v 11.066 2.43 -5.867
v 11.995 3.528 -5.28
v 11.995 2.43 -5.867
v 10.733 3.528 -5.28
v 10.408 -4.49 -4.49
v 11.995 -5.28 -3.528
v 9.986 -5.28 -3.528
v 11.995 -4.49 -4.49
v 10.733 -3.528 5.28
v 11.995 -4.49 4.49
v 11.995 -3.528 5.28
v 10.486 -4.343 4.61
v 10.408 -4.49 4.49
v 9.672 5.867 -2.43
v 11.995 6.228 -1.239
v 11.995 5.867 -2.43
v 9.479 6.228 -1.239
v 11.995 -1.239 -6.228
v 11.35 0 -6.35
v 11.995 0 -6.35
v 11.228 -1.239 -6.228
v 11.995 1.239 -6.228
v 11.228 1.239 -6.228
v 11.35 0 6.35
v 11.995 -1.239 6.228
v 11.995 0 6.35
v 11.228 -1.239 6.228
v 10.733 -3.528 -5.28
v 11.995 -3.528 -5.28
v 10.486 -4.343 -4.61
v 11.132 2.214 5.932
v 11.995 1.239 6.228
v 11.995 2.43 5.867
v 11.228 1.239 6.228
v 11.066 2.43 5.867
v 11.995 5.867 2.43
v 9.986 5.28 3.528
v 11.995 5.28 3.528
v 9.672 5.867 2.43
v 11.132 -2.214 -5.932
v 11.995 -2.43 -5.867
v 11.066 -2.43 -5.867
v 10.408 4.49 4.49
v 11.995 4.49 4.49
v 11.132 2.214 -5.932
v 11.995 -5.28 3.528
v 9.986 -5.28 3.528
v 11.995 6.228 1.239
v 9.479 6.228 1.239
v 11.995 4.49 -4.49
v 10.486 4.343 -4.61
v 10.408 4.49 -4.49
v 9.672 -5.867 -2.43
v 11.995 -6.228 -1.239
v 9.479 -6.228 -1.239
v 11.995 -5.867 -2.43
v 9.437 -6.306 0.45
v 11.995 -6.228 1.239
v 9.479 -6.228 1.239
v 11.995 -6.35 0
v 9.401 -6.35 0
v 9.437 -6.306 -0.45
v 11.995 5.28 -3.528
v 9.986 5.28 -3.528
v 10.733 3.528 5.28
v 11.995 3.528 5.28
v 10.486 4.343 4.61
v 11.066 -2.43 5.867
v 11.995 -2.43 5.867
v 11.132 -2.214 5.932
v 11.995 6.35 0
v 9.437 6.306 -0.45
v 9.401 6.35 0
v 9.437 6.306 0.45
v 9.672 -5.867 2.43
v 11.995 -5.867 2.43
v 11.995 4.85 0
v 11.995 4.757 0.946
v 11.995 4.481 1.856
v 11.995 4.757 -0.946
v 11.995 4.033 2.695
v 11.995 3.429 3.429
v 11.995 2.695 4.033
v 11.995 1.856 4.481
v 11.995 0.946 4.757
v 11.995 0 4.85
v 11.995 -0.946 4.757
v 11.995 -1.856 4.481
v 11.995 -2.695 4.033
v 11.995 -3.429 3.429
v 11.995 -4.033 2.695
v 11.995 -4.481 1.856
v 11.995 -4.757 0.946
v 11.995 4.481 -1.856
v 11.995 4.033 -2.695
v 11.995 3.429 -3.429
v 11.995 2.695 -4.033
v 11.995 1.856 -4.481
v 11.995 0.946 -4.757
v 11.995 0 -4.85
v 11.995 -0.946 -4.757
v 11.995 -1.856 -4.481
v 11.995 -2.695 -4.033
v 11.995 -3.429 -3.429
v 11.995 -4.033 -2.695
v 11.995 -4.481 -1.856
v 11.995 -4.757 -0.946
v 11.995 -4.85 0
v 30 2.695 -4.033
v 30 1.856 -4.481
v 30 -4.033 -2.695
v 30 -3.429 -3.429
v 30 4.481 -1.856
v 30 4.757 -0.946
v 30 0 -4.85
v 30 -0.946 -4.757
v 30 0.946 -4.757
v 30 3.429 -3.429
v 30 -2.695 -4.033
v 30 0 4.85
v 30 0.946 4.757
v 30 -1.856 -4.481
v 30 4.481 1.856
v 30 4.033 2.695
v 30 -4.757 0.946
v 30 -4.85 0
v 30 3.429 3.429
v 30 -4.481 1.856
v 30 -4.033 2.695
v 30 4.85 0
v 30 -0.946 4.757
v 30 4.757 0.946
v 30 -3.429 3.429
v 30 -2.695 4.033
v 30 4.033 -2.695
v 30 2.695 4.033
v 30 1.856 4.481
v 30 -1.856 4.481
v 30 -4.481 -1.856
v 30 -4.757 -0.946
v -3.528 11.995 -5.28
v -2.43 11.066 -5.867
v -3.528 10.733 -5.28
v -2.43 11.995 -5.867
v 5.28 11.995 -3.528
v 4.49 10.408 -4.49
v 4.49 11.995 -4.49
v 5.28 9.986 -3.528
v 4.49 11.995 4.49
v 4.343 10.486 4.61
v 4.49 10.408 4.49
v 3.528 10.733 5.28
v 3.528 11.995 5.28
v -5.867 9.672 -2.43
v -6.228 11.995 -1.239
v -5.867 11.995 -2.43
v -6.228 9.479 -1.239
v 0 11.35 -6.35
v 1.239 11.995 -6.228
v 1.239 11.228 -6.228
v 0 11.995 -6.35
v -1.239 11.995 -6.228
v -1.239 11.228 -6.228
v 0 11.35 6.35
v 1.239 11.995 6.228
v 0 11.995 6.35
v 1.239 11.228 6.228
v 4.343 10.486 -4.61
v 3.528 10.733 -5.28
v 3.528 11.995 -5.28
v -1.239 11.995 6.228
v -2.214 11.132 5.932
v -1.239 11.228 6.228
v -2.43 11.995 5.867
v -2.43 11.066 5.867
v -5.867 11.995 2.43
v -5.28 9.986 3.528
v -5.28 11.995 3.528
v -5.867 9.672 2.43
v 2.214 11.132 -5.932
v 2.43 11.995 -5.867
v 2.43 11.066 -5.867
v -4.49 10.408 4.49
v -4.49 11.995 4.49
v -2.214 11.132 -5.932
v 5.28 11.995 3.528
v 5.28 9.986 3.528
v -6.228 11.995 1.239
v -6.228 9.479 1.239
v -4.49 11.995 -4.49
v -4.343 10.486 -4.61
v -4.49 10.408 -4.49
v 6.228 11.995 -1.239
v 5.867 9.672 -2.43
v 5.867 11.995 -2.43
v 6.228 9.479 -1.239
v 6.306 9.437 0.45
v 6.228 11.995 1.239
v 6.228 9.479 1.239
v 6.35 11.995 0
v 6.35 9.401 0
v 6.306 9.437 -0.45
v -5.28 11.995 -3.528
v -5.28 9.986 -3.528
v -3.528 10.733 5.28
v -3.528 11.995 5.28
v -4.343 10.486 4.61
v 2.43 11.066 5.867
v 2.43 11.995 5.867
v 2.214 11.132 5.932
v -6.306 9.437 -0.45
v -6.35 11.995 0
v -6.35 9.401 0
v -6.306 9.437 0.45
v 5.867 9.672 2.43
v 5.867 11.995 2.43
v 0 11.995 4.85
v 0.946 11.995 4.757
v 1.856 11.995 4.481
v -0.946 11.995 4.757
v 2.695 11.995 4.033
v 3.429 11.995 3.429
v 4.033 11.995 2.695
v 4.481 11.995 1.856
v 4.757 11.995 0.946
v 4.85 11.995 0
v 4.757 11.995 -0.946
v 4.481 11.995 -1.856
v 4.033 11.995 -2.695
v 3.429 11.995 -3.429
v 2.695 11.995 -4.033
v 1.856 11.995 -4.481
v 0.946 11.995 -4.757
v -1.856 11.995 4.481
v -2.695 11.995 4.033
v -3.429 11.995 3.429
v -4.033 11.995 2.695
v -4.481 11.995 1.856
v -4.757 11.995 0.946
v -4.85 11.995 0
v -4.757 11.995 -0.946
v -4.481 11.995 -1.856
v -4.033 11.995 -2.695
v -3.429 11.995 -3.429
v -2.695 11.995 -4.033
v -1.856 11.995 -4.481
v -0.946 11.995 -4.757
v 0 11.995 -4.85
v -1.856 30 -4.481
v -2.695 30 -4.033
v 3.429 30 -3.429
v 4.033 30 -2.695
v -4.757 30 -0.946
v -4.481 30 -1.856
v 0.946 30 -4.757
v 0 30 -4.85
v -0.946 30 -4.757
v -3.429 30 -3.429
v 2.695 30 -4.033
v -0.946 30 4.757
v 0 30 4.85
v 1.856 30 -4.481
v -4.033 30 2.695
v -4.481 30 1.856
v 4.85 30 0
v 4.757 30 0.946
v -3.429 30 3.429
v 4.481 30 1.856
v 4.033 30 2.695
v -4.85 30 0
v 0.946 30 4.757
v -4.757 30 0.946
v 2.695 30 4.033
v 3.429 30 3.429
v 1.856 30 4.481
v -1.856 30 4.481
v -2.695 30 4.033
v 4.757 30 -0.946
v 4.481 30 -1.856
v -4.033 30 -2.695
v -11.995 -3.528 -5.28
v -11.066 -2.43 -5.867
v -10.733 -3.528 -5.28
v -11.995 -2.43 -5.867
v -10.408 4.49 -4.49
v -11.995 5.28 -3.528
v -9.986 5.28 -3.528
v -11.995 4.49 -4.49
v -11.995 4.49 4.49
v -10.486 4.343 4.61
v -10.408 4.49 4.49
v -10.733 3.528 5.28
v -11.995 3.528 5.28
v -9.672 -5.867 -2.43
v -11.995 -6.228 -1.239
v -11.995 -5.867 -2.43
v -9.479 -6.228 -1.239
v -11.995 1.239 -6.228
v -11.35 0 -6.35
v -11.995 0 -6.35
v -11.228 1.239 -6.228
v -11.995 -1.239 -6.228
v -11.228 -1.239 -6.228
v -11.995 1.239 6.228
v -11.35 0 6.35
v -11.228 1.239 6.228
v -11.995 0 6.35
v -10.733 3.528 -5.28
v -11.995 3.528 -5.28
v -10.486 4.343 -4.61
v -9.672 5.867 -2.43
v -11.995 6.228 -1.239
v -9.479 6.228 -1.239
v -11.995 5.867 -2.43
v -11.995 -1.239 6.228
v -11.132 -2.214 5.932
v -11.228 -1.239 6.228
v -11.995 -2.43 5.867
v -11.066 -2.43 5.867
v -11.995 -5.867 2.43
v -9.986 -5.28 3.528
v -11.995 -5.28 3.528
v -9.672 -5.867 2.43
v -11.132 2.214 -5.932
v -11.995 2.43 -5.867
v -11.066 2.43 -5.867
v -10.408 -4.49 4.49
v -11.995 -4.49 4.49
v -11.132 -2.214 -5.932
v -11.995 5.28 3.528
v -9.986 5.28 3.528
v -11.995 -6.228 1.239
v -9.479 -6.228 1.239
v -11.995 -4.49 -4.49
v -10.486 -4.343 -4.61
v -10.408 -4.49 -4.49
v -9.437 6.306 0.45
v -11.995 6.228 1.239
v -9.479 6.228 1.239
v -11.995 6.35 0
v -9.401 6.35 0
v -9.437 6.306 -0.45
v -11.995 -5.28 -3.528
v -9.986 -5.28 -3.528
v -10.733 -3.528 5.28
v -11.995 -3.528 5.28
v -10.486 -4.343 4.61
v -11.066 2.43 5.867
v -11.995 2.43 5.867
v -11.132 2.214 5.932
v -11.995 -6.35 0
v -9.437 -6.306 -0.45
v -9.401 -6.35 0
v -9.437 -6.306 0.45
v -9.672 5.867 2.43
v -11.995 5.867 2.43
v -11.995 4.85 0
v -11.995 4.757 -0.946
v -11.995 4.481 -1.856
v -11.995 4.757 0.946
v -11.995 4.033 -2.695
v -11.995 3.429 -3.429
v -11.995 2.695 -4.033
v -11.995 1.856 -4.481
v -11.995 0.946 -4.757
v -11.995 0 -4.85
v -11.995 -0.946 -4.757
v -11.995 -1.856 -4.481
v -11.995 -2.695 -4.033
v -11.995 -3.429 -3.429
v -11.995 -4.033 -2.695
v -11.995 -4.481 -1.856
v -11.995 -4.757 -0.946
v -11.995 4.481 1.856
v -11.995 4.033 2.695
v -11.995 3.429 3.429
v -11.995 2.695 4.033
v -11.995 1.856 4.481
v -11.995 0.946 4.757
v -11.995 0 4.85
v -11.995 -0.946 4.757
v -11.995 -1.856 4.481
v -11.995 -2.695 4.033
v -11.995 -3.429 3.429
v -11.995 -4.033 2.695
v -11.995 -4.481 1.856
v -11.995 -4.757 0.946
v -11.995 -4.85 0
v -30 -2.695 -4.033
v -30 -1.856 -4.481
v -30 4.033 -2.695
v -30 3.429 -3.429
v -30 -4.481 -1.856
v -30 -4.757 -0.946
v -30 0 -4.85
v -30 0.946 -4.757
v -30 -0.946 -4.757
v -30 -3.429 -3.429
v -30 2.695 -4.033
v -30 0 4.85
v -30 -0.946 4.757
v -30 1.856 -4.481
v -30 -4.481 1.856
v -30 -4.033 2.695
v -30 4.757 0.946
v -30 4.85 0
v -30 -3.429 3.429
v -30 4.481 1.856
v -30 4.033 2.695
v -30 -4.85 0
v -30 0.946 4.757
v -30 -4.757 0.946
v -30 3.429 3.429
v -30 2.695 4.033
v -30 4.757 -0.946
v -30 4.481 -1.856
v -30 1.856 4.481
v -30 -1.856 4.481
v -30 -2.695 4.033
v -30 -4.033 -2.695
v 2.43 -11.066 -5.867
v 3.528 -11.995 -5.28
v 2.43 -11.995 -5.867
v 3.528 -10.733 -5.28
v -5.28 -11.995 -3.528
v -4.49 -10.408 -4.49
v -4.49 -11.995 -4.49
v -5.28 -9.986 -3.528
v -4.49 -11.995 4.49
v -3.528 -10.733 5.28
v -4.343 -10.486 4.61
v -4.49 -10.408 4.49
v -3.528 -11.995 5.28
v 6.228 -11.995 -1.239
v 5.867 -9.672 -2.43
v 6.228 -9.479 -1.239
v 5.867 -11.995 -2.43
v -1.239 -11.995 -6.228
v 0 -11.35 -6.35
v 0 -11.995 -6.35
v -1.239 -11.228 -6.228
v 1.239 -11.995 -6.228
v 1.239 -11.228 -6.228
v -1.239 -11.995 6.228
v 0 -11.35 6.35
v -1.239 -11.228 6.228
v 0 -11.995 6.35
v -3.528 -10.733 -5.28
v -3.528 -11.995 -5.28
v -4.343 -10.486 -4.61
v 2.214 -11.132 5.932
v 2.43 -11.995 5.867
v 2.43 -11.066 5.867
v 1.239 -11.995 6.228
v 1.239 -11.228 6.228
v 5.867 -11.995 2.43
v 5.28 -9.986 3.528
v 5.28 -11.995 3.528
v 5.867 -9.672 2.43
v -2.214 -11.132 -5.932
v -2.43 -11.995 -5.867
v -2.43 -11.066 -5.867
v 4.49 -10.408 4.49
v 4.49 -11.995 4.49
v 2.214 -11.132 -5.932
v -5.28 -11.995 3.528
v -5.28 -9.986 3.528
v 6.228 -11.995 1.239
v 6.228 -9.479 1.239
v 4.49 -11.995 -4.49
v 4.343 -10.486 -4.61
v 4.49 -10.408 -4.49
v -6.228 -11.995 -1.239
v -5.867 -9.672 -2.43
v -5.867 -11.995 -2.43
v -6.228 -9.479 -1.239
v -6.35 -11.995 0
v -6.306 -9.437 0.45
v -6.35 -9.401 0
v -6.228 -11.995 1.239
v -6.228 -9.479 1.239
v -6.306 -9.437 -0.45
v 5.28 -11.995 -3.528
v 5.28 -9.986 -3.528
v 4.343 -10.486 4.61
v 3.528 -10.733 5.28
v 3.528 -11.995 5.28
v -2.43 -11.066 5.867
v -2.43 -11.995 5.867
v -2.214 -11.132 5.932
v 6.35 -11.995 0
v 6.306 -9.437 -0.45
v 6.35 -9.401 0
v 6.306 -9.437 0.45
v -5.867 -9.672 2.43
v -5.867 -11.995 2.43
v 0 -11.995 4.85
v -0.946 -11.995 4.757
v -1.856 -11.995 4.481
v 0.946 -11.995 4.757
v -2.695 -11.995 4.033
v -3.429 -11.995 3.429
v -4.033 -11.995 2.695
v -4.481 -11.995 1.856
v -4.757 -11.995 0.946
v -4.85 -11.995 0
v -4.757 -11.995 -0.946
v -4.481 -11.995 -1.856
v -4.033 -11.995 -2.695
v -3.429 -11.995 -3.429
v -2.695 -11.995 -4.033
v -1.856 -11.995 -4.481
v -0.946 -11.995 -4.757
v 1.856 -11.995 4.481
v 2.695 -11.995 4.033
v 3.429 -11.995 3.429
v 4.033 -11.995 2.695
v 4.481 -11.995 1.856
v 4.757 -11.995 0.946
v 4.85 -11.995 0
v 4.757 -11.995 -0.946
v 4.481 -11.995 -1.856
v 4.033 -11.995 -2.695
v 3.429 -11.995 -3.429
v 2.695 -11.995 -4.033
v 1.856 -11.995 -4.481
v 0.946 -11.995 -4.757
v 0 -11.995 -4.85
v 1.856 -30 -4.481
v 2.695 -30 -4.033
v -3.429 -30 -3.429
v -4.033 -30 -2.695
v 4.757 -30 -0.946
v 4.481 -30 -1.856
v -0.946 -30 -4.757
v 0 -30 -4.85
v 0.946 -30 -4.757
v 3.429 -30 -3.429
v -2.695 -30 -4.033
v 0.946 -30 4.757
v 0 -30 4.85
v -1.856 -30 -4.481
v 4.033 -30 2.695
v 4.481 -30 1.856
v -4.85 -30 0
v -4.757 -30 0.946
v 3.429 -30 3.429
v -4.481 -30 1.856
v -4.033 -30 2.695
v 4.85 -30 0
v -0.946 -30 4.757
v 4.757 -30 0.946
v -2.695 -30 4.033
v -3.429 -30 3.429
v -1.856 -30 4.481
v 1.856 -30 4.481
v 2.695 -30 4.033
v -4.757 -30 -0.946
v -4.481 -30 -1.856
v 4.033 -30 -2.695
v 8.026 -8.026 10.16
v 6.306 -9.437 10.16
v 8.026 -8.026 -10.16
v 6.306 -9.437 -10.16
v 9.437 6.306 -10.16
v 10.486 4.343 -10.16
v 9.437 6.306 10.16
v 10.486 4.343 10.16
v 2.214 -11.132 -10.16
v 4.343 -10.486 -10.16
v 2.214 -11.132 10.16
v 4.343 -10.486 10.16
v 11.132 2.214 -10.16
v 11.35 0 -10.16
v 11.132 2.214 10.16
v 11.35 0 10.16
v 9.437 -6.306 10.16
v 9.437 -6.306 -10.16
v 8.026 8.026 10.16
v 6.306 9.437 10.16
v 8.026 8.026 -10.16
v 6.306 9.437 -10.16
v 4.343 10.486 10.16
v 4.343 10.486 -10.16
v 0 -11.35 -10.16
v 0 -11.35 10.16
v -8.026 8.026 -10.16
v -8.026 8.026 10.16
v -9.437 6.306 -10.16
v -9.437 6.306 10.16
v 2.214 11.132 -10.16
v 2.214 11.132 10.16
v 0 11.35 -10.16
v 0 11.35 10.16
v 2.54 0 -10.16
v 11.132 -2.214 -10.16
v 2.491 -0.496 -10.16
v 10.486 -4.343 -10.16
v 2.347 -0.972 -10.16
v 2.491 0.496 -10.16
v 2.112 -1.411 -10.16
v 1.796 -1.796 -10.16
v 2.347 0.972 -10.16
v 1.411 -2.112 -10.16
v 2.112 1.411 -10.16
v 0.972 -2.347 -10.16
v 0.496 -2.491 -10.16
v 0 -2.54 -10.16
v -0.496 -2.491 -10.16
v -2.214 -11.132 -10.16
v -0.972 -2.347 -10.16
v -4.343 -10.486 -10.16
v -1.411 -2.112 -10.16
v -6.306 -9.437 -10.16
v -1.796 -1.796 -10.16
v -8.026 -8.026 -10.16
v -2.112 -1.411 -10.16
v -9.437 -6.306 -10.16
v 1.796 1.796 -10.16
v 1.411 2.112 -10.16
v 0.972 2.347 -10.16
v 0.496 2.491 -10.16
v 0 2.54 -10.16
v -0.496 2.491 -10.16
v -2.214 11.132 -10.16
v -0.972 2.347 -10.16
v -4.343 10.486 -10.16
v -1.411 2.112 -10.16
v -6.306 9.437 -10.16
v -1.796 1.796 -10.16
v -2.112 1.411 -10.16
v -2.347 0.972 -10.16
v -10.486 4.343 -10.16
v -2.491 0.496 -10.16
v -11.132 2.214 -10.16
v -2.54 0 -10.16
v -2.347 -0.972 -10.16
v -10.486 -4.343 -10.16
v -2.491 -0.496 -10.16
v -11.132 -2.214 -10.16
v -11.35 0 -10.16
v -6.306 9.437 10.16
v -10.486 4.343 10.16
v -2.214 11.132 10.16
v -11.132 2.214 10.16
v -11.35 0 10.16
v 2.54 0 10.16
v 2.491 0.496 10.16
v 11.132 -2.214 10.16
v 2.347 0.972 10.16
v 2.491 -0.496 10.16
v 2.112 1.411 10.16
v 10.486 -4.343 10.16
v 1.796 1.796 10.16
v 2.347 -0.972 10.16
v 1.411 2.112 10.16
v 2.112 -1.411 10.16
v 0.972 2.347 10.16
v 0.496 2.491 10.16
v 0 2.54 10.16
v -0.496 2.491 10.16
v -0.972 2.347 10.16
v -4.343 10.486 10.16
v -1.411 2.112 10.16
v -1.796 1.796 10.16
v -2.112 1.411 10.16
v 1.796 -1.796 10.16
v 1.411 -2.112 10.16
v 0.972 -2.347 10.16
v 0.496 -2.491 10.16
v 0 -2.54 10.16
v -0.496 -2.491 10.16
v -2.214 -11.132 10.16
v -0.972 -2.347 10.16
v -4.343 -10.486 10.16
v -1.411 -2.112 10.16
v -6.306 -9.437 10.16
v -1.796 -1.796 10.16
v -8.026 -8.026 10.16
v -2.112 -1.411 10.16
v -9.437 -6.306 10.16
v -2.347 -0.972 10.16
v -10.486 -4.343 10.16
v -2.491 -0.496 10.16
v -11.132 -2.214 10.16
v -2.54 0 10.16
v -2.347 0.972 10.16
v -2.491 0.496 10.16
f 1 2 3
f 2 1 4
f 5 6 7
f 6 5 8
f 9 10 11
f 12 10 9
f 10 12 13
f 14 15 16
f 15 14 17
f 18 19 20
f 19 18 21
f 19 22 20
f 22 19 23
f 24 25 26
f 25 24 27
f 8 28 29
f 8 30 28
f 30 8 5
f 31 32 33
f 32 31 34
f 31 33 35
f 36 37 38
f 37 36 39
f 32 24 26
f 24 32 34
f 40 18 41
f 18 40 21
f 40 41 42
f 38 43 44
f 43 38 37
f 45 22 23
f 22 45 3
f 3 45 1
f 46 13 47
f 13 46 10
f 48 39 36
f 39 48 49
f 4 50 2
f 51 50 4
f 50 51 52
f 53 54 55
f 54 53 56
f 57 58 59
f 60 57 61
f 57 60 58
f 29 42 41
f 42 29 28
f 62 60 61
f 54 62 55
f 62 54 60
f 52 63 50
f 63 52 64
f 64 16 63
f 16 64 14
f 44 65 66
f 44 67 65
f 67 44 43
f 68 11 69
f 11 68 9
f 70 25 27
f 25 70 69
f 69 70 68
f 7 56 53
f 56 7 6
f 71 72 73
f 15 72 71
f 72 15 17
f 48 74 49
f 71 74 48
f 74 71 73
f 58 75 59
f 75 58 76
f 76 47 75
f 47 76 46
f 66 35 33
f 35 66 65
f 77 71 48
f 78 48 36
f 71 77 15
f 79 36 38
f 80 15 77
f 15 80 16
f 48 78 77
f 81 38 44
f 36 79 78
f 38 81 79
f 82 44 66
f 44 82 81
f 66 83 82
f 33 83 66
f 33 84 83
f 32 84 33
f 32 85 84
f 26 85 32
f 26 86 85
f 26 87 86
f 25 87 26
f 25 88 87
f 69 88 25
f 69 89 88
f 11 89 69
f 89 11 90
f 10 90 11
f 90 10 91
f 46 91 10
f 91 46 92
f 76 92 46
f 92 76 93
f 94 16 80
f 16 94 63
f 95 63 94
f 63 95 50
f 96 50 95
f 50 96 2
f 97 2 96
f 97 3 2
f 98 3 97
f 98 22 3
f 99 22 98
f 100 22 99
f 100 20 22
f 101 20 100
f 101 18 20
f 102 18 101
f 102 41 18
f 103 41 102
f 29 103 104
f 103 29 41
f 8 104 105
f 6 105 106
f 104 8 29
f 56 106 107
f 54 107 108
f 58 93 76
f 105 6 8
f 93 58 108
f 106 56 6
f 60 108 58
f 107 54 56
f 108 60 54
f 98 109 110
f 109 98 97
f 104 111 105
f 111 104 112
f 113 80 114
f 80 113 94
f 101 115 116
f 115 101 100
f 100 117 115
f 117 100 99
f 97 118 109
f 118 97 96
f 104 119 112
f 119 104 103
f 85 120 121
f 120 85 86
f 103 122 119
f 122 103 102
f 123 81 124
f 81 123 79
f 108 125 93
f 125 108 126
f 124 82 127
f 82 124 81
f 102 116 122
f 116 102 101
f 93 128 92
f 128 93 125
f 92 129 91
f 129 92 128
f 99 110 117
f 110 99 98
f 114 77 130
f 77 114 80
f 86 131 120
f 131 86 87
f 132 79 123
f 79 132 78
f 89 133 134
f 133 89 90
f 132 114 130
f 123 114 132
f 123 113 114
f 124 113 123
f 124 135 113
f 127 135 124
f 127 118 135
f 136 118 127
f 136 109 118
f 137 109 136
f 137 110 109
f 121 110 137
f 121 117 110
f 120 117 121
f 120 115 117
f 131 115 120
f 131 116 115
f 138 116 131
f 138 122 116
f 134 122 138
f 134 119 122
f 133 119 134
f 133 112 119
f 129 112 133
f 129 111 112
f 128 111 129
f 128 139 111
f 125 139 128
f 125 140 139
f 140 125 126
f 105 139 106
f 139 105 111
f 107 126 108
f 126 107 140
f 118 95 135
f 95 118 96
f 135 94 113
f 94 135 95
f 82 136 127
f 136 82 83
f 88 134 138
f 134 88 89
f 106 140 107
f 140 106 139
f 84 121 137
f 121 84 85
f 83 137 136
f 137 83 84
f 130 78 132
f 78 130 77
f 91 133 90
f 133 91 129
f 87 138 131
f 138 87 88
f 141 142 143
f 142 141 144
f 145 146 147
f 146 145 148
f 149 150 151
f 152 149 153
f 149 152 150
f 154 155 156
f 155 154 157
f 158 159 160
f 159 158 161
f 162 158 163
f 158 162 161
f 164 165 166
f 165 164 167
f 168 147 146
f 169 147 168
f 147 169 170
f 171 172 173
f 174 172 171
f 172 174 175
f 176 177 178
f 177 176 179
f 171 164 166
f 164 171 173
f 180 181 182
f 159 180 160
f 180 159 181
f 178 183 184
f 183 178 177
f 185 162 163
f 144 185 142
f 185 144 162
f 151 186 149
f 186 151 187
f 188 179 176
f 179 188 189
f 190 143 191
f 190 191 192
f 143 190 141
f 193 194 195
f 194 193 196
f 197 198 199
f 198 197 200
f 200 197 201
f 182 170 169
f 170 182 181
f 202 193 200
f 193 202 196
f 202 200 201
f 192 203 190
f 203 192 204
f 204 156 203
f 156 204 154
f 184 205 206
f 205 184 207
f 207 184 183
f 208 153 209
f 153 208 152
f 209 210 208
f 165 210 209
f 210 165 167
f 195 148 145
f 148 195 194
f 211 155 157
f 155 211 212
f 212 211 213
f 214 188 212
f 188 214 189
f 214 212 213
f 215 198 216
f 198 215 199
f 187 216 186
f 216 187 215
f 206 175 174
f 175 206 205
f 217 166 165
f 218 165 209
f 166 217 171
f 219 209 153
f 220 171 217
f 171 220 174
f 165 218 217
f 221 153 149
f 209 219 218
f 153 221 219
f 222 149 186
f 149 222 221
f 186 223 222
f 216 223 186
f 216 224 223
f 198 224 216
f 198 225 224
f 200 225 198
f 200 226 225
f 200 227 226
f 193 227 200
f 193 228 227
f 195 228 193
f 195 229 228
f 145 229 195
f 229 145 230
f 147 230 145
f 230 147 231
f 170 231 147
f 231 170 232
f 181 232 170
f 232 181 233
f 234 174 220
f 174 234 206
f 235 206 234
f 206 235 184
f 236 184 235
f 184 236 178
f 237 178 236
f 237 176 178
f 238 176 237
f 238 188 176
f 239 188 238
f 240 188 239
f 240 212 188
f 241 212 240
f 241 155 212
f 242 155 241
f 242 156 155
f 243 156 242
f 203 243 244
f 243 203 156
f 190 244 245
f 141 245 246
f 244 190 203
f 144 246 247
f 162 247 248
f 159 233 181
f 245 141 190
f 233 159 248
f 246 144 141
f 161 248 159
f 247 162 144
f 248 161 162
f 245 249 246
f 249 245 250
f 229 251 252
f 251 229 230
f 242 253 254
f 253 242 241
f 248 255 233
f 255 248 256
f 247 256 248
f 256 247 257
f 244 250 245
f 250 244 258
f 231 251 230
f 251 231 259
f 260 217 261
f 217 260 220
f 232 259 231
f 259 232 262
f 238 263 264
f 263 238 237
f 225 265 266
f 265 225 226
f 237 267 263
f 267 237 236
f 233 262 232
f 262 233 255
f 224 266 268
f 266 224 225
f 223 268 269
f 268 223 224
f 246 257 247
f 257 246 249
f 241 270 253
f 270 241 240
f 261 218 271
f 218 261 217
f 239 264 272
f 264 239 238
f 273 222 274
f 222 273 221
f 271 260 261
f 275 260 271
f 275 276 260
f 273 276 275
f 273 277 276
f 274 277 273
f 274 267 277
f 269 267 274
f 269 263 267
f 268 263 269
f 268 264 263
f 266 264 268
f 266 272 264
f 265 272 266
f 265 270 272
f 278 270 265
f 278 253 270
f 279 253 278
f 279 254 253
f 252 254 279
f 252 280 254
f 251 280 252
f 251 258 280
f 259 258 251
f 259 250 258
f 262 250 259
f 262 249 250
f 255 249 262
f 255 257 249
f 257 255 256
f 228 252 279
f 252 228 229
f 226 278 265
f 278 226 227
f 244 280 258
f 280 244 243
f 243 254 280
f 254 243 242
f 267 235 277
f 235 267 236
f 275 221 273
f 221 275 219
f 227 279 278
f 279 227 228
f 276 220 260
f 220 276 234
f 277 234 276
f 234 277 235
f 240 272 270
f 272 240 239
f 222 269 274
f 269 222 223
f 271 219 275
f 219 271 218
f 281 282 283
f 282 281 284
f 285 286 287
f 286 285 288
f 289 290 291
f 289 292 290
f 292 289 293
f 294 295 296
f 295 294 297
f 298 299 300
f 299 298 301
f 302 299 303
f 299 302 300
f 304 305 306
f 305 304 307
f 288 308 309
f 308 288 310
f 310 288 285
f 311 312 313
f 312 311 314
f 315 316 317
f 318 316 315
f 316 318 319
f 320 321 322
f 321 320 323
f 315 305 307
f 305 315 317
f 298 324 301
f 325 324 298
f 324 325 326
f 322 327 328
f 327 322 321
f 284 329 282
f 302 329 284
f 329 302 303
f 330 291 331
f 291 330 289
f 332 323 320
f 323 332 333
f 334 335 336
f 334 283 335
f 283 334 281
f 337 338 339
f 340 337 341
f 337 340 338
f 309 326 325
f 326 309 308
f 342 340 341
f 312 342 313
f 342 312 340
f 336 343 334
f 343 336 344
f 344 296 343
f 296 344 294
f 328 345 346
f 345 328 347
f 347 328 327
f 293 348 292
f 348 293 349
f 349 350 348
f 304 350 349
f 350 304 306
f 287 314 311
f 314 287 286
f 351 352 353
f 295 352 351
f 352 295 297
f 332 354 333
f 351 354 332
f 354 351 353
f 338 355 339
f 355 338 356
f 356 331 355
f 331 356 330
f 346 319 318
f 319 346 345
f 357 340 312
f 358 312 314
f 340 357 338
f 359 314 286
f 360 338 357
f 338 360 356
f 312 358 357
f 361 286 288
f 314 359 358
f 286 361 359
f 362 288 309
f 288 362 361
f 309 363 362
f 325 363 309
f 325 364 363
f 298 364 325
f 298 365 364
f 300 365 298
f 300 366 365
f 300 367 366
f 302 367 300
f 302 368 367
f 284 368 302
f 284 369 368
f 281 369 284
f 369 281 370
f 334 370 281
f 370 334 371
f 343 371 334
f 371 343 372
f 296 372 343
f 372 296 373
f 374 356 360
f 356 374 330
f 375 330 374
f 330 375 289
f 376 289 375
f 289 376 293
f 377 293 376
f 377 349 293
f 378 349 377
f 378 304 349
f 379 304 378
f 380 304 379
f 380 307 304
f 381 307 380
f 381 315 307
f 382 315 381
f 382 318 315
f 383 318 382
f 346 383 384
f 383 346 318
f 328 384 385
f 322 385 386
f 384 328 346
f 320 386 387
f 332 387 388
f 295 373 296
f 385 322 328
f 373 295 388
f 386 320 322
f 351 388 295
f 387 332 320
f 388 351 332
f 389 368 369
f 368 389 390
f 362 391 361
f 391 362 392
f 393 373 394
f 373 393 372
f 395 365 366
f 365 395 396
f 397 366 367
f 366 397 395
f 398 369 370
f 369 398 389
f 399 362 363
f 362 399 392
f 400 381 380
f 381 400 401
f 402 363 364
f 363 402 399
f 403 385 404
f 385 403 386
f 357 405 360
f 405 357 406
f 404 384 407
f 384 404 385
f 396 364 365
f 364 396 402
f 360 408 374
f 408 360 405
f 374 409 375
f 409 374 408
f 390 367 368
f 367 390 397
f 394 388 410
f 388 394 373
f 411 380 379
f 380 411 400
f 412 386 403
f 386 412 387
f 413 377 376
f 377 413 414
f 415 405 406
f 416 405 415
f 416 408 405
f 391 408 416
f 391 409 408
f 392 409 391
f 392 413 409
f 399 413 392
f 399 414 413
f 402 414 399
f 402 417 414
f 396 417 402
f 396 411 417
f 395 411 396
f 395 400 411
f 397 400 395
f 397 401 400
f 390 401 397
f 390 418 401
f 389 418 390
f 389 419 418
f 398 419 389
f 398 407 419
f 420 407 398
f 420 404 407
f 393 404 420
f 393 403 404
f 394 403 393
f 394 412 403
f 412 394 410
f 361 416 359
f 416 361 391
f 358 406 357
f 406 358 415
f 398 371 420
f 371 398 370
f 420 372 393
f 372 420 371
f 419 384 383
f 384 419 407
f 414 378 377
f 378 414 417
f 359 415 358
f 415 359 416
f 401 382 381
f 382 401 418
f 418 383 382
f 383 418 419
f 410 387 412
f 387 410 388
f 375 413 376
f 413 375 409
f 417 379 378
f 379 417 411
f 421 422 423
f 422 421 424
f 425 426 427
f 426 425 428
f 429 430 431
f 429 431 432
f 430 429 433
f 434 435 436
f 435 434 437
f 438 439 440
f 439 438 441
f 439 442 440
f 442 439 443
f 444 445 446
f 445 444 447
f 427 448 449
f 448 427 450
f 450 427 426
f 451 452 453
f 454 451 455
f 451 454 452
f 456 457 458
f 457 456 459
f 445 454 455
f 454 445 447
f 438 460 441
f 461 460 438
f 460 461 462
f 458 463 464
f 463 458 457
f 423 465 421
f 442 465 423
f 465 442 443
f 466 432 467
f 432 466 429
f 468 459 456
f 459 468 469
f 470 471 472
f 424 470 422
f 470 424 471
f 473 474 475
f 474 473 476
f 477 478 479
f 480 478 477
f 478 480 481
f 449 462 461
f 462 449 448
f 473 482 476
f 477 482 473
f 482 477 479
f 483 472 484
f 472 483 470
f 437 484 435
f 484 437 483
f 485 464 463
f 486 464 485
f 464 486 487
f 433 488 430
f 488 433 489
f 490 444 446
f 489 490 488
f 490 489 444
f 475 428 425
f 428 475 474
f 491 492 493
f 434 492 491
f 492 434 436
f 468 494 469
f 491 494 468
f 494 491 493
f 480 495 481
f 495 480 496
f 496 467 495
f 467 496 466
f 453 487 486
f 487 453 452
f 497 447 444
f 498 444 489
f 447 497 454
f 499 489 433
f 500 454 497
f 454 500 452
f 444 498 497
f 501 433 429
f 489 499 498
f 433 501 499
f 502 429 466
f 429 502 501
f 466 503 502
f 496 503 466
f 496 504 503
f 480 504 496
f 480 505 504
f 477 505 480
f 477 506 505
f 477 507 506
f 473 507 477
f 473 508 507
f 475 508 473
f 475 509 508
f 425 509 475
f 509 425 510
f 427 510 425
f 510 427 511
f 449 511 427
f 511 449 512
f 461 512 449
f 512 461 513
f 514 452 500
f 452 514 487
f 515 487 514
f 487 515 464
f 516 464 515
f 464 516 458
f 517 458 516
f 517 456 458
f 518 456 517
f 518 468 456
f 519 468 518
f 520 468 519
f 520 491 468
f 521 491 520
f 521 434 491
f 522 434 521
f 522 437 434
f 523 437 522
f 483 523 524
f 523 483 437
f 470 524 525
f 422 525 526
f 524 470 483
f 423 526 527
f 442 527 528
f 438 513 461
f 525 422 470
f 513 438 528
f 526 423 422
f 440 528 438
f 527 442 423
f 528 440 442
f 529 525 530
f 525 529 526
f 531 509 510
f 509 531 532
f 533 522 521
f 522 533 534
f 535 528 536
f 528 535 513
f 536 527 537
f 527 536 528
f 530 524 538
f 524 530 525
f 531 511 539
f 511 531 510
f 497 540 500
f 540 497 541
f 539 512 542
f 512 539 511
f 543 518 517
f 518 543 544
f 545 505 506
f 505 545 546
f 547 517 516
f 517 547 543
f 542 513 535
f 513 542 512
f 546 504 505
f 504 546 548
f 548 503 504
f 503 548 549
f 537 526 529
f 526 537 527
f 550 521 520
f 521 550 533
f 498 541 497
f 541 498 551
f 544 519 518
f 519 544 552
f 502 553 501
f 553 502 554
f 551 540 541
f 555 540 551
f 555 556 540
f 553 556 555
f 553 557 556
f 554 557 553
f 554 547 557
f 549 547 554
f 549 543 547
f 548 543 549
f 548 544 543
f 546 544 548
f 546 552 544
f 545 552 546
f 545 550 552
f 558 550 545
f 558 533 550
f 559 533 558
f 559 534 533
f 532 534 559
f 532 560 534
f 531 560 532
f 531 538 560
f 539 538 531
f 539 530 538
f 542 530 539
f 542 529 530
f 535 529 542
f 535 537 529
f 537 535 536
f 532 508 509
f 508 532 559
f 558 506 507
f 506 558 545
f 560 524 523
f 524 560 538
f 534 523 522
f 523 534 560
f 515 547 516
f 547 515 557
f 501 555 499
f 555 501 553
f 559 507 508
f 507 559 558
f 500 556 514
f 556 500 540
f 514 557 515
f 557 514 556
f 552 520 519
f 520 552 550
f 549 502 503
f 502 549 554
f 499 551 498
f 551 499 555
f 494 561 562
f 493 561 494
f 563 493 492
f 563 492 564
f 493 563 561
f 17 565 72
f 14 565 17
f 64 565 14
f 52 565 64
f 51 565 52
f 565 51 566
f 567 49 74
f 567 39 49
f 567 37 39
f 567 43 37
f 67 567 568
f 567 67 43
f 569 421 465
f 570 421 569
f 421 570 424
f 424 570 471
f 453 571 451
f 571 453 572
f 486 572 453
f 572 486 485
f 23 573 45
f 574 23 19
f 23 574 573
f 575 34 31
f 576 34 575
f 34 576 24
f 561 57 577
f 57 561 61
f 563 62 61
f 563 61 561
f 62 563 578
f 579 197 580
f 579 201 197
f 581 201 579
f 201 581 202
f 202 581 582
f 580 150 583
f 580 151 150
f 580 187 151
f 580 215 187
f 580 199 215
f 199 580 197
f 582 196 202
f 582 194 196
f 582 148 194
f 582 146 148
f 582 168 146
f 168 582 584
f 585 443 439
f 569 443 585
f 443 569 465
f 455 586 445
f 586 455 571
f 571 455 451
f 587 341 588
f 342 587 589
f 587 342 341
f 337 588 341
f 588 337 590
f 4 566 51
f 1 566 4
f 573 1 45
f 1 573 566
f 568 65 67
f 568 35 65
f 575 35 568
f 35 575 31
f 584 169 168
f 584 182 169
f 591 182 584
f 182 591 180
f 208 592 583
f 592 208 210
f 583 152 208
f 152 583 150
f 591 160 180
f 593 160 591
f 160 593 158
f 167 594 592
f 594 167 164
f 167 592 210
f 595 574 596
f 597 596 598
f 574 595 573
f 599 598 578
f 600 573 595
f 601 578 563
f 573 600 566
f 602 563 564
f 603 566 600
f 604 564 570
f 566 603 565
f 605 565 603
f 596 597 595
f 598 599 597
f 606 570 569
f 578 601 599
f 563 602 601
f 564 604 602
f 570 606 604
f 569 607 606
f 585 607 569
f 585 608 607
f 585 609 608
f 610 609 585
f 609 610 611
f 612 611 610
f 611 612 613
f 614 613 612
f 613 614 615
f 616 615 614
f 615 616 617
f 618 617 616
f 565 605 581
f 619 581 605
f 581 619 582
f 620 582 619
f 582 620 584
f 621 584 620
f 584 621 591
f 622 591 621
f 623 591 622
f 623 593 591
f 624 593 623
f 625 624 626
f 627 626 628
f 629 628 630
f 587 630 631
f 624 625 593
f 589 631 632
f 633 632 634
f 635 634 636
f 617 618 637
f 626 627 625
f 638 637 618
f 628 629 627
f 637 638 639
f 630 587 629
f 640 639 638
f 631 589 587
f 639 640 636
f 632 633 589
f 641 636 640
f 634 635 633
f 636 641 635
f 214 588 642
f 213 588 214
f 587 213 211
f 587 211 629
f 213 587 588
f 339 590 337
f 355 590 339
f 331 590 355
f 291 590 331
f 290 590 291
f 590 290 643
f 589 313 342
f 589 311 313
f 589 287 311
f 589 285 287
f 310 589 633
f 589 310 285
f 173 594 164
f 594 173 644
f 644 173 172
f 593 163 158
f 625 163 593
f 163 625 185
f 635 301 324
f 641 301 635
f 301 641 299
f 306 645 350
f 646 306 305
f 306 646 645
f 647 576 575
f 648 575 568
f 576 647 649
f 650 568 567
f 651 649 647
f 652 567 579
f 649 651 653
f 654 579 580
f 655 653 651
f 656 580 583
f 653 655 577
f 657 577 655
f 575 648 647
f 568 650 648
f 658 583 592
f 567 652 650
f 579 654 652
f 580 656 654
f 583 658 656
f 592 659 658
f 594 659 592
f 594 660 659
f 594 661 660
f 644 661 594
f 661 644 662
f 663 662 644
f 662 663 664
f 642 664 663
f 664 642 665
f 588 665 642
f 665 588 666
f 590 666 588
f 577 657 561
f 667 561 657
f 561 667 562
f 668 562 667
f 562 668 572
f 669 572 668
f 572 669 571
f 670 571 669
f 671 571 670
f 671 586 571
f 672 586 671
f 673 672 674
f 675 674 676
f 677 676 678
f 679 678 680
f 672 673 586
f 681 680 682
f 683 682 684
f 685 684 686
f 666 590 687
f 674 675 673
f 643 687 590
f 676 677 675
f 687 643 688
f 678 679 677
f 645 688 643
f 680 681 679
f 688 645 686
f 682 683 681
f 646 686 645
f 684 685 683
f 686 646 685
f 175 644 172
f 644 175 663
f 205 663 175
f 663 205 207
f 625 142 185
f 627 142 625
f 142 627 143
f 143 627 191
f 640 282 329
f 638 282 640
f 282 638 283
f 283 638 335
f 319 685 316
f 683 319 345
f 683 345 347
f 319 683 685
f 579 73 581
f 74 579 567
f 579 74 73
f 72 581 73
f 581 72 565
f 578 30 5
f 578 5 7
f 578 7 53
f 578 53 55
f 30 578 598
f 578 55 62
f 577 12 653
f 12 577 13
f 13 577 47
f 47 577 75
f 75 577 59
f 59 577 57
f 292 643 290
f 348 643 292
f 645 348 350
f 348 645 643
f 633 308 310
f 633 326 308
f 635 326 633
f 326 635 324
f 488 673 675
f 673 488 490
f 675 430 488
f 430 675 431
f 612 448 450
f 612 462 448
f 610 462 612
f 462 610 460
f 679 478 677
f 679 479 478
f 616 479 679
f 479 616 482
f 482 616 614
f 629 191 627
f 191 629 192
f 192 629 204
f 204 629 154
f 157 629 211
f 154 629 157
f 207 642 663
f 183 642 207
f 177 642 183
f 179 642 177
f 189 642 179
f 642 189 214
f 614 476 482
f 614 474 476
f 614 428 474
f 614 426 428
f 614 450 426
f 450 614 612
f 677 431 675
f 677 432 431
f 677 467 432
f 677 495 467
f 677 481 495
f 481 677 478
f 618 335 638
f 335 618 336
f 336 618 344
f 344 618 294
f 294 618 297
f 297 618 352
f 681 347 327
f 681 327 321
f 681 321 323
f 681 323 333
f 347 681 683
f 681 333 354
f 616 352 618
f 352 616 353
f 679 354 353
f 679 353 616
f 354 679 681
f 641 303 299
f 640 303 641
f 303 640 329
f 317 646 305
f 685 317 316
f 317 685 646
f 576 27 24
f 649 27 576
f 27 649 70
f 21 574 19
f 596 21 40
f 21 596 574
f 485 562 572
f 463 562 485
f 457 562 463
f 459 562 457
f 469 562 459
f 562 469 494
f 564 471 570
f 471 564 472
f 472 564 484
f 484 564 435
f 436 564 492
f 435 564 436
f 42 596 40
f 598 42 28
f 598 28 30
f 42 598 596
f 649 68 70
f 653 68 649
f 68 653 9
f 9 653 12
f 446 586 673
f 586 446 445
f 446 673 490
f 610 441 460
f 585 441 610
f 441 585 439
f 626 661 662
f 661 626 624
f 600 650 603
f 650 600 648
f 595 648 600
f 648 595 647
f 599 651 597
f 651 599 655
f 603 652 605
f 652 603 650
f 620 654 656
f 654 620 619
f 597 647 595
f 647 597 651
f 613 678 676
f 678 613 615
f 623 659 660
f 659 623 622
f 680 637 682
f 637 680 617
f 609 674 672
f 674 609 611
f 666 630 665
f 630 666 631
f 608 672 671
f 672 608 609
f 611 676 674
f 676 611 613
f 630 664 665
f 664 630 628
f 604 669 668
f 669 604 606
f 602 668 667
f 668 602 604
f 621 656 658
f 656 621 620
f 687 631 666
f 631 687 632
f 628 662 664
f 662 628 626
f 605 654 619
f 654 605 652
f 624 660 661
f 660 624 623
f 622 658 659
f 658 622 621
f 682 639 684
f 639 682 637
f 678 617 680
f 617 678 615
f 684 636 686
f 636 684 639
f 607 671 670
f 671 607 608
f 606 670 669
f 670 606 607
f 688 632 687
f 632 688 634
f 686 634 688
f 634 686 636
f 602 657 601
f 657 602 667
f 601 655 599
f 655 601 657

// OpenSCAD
$fn = 32;

// ----------------------------------------------------------------------
// Cardan cross: 60 mm span, 12.7 mm trunnions
// ----------------------------------------------------------------------

// --- parameters (mm) ---
journal_d = 12.7;         // trunnion diameter
arm_len = 30;             // trunnion length from the centre
step_r = 4.32;            // step position from the centre
step_d = 9.7;             // journal diameter after the step
hub_d = 22.7;             // hub diameter
hub_h = 20.32;            // hub height
bore_d = 5.08;            // hub bore

difference() {
  union() {
    /* hub along the joint axis */
    cylinder(h = hub_h, d = hub_d, center = true);
    for (a = [0 : 90 : 270]) rotate([0, 0, a]) {
      /* trunnion, sunk into the hub */
      translate([hub_d / 4, 0, 0]) rotate([0, 90, 0]) cylinder(h = step_r + 2, d = journal_d);
      /* stepped journal out to the tip */
      translate([step_r - 0.5, 0, 0]) rotate([0, 90, 0]) cylinder(h = arm_len + 0.5 - step_r, d = step_d);
    }
  }
  /* lubrication bore through the hub, 2.5 mm clear on both sides */
  translate([0, 0, -hub_h / 2 - 2.5]) cylinder(h = hub_h + 5, d = bore_d);
}
